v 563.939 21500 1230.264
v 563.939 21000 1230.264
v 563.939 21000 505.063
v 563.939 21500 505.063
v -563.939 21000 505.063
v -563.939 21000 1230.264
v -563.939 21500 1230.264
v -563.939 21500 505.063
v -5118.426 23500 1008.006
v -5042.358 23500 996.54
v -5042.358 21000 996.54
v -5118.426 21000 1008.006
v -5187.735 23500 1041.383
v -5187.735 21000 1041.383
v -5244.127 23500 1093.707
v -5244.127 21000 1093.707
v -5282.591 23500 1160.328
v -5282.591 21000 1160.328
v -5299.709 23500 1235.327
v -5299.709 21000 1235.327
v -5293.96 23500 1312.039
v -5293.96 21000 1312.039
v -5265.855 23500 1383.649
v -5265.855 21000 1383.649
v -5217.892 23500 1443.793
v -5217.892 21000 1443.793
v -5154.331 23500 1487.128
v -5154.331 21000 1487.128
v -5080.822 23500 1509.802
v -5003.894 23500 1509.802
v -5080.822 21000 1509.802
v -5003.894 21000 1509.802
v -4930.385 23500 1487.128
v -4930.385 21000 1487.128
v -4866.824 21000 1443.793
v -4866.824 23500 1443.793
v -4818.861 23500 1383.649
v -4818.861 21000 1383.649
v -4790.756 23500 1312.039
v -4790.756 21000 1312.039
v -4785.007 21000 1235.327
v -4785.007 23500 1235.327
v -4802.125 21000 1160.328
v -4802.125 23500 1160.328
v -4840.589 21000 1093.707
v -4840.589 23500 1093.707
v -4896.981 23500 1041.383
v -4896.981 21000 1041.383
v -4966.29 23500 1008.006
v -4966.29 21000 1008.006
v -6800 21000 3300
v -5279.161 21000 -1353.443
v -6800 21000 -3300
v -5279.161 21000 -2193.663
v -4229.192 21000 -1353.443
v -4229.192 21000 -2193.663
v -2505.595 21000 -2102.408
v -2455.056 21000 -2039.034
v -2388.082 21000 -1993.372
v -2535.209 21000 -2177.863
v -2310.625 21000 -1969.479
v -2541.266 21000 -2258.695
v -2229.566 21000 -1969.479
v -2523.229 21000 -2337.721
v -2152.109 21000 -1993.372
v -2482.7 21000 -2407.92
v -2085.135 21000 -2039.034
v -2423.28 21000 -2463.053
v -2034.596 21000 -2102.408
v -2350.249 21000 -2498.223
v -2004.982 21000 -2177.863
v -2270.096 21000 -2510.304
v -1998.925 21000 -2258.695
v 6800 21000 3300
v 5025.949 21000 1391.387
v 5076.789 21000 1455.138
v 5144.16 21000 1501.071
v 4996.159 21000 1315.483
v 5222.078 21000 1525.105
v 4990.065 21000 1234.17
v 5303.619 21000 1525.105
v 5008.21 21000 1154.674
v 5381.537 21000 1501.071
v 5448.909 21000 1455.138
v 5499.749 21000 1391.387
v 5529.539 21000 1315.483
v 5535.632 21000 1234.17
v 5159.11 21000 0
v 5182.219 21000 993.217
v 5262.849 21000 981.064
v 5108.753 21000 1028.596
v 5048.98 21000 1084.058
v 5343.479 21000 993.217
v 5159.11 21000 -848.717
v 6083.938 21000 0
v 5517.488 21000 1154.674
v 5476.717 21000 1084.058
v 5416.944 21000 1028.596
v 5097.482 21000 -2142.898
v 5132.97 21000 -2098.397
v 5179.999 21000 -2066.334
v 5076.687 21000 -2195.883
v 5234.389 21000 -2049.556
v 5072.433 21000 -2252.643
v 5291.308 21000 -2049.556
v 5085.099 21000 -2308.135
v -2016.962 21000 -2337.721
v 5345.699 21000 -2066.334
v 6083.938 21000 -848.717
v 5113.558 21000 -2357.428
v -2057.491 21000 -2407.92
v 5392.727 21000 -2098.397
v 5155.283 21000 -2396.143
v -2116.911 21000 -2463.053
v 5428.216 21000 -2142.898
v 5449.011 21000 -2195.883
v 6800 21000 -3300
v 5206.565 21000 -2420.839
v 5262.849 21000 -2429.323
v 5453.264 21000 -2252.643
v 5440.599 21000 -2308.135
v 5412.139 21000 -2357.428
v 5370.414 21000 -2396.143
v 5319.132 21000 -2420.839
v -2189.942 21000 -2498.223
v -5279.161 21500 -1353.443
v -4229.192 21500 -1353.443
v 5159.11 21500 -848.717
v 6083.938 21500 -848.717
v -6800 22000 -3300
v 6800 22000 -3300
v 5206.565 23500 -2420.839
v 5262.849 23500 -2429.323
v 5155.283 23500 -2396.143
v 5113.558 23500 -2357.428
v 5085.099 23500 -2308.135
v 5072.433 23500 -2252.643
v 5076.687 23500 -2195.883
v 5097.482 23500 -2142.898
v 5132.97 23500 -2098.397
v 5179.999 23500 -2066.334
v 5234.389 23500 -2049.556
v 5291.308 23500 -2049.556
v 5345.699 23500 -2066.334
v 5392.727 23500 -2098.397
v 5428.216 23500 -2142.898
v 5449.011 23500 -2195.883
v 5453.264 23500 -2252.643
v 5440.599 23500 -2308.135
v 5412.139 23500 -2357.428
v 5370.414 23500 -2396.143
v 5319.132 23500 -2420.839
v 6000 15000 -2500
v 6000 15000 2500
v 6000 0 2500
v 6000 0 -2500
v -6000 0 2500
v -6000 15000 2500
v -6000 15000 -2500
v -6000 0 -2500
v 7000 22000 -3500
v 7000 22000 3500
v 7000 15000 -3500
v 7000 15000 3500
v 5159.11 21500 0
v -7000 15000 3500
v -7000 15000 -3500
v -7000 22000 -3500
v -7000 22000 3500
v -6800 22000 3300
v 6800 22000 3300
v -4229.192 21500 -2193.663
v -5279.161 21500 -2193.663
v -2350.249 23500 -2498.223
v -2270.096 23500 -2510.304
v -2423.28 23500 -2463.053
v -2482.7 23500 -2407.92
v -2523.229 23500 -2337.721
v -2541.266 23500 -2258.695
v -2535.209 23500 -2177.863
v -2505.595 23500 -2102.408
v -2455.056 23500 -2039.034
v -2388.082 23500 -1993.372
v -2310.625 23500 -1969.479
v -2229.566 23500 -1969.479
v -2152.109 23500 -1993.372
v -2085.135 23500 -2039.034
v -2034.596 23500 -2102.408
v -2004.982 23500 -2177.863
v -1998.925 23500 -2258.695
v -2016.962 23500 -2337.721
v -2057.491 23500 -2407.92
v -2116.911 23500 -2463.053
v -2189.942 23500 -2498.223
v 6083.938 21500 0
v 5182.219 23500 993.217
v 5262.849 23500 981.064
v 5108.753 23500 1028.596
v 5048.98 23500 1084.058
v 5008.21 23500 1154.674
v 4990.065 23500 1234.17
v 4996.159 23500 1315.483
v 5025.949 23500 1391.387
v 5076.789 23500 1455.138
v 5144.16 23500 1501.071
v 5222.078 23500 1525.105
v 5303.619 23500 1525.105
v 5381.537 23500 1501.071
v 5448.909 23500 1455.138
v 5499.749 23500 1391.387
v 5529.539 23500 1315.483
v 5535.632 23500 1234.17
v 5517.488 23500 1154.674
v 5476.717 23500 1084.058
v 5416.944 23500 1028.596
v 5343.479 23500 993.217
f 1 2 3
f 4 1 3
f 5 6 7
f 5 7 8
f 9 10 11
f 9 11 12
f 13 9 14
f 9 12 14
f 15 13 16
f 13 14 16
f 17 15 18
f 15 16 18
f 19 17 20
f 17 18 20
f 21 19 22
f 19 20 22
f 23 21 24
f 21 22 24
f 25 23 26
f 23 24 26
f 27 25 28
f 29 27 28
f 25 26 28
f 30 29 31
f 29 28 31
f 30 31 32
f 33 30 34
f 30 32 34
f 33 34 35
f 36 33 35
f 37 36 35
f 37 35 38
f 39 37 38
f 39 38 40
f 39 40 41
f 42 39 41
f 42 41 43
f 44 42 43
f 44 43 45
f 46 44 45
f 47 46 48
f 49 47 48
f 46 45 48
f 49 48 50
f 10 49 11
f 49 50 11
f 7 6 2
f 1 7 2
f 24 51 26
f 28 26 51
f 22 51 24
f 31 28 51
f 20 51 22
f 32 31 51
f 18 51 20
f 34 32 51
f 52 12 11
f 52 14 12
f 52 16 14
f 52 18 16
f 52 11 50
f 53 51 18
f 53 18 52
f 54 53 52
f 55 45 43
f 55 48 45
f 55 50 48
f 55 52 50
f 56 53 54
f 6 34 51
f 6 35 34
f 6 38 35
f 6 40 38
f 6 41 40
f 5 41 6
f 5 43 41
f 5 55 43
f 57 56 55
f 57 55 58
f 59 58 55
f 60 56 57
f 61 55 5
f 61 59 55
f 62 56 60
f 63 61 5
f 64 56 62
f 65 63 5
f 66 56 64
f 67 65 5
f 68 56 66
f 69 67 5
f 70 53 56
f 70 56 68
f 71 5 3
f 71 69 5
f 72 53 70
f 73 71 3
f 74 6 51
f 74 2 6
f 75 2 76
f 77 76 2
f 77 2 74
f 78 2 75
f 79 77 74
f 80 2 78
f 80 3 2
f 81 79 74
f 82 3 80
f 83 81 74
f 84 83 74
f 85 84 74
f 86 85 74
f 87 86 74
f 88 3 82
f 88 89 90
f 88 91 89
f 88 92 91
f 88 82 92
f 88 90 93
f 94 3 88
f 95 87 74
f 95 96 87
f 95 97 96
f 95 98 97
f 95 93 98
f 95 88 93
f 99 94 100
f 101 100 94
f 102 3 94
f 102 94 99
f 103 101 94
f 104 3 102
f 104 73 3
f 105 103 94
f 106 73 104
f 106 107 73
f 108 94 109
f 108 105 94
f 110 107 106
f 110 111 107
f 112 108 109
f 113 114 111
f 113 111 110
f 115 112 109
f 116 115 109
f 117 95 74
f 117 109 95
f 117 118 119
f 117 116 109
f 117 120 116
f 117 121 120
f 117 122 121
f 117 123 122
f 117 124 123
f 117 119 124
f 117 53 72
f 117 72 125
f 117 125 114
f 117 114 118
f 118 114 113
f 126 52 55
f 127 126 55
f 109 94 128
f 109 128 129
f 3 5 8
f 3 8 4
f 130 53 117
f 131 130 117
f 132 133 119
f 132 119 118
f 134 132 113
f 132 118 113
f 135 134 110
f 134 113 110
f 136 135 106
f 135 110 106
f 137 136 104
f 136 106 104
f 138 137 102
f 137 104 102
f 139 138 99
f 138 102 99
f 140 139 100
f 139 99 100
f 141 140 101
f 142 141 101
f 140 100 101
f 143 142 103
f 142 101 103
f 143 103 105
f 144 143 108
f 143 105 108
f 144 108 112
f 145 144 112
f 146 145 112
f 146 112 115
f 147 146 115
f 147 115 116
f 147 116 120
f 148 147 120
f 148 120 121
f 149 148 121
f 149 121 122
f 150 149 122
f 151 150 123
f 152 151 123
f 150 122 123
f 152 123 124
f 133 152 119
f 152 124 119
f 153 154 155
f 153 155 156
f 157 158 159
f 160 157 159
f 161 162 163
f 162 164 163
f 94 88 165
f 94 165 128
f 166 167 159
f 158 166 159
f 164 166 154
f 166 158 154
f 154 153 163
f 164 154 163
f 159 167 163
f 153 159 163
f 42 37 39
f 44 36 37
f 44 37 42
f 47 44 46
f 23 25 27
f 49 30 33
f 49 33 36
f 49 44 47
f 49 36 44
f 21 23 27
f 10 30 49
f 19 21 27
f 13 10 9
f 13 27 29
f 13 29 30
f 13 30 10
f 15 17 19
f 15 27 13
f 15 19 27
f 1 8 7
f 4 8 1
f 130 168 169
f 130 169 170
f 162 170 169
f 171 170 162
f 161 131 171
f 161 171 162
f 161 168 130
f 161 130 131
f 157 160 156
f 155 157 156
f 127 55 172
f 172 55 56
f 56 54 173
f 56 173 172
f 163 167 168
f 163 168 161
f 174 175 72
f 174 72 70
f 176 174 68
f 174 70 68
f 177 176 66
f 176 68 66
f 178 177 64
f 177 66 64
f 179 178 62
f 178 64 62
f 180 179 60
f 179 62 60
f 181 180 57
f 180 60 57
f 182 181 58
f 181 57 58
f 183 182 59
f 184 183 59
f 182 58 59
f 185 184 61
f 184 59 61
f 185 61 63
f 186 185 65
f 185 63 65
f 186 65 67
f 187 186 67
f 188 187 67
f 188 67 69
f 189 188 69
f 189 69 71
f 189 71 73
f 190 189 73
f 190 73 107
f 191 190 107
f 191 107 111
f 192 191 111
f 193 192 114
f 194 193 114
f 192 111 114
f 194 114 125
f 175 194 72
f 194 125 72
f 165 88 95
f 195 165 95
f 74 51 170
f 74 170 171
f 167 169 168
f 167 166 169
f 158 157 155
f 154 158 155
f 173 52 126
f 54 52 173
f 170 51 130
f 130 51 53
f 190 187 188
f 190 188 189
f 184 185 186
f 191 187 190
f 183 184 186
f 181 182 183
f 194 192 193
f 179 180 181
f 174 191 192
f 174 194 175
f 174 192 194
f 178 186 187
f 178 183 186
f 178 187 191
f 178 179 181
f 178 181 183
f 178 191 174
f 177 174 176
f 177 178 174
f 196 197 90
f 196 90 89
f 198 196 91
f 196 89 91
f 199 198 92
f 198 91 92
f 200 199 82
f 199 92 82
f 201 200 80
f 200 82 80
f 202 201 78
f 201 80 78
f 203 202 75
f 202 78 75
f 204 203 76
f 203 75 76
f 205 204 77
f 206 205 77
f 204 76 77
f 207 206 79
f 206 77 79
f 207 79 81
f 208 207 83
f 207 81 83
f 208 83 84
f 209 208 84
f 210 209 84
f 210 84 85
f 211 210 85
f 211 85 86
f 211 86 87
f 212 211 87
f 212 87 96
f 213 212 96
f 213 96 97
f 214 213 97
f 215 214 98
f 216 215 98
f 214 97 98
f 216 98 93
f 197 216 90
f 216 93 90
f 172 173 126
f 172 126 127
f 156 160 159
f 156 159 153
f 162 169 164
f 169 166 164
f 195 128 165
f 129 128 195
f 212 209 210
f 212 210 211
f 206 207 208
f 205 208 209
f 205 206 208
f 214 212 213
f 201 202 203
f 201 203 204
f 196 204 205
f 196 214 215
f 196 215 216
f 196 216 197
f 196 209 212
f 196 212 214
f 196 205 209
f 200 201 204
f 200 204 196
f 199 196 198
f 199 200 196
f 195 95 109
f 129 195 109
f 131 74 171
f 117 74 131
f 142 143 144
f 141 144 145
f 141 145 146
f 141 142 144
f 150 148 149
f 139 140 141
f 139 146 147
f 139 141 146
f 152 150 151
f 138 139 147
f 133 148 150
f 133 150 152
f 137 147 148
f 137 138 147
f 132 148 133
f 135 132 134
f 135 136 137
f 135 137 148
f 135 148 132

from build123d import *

# Parameters (mm, degrees)
SKETCH1_W           = 12000
SKETCH1_H           = 5000
BOSS_EXTRUDE1_DEPTH = 15000
SKETCH2_W           = 14000
SKETCH2_H           = 7000
BOSS_EXTRUDE2_DEPTH = 6000
SKETCH3_W           = 14000
SKETCH3_H           = 7000
SKETCH3_W_2         = 13600
SKETCH3_H_2         = 6600
BOSS_EXTRUDE3_DEPTH = 1000
SKETCH4_W           = 1049.969098562
SKETCH4_H           = 840.219930543
SKETCH4_W_2         = 1127.878396032
SKETCH4_H_2         = 725.200774448
SKETCH4_W_3         = 924.827627364
SKETCH4_H_3         = 848.717356224
BOSS_EXTRUDE4_DEPTH = 500
SKETCH5_R           = 271.931197036
SKETCH5_R_2         = 273.548394489
SKETCH5_R_3         = 258.072287822
SKETCH5_R_4         = 190.94954072
BOSS_EXTRUDE5_DEPTH = 2500


with BuildPart() as part:
    # Sketch1 → Boss-Extrude1 (new body)
    with BuildSketch(Plane(origin=(0, 0, 0), x_dir=(1, 0, 0), z_dir=(0, 1, 0))):
        Rectangle(SKETCH1_W, SKETCH1_H)
    extrude(amount=BOSS_EXTRUDE1_DEPTH)

    # Sketch2 → Boss-Extrude2 (add)
    with BuildSketch(Plane(origin=(0, 15000, 0), x_dir=(1, 0, 0), z_dir=(0, 1, 0))):
        Rectangle(SKETCH2_W, SKETCH2_H)
    extrude(amount=BOSS_EXTRUDE2_DEPTH)

    # Sketch3 → Boss-Extrude3 (add)
    with BuildSketch(Plane(origin=(0, 21000, 0), x_dir=(1, 0, 0), z_dir=(0, 1, 0))):
        Rectangle(SKETCH3_W, SKETCH3_H)
        Rectangle(SKETCH3_W_2, SKETCH3_H_2, mode=Mode.SUBTRACT)
    extrude(amount=BOSS_EXTRUDE3_DEPTH)

    # Sketch4 → Boss-Extrude4 (add)
    with BuildSketch(Plane(origin=(0, 21000, 0), x_dir=(1, 0, 0), z_dir=(0, 1, 0))):
        with Locations((-4754.176628247, 1773.552806211)):
            Rectangle(SKETCH4_W, SKETCH4_H)
        with Locations((0, -867.663547302)):
            Rectangle(SKETCH4_W_2, SKETCH4_H_2)
        with Locations((5621.523846524, 424.358678112)):
            Rectangle(SKETCH4_W_3, SKETCH4_H_3)
    extrude(amount=BOSS_EXTRUDE4_DEPTH)

    # Sketch5 → Boss-Extrude5 (add)
    with BuildSketch(Plane(origin=(0, 21000, 0), x_dir=(1, 0, 0), z_dir=(0, 1, 0))):
        with Locations(Location((-2270.095584956, 2238.373193315, 0), (0, 0, 90))):
            Circle(SKETCH5_R)
        with Locations(Location((5262.848698071, -1254.612412688, 0), (0, 0, 90))):
            Circle(SKETCH5_R_2)
        with Locations(Location((-5042.358088057, -1254.612412688, 0), (0, 0, 90))):
            Circle(SKETCH5_R_3)
        with Locations(Location((5262.848698071, 2238.373193315, 0), (0, 0, 90))):
            Circle(SKETCH5_R_4)
    extrude(amount=BOSS_EXTRUDE5_DEPTH)


solid = part.part
